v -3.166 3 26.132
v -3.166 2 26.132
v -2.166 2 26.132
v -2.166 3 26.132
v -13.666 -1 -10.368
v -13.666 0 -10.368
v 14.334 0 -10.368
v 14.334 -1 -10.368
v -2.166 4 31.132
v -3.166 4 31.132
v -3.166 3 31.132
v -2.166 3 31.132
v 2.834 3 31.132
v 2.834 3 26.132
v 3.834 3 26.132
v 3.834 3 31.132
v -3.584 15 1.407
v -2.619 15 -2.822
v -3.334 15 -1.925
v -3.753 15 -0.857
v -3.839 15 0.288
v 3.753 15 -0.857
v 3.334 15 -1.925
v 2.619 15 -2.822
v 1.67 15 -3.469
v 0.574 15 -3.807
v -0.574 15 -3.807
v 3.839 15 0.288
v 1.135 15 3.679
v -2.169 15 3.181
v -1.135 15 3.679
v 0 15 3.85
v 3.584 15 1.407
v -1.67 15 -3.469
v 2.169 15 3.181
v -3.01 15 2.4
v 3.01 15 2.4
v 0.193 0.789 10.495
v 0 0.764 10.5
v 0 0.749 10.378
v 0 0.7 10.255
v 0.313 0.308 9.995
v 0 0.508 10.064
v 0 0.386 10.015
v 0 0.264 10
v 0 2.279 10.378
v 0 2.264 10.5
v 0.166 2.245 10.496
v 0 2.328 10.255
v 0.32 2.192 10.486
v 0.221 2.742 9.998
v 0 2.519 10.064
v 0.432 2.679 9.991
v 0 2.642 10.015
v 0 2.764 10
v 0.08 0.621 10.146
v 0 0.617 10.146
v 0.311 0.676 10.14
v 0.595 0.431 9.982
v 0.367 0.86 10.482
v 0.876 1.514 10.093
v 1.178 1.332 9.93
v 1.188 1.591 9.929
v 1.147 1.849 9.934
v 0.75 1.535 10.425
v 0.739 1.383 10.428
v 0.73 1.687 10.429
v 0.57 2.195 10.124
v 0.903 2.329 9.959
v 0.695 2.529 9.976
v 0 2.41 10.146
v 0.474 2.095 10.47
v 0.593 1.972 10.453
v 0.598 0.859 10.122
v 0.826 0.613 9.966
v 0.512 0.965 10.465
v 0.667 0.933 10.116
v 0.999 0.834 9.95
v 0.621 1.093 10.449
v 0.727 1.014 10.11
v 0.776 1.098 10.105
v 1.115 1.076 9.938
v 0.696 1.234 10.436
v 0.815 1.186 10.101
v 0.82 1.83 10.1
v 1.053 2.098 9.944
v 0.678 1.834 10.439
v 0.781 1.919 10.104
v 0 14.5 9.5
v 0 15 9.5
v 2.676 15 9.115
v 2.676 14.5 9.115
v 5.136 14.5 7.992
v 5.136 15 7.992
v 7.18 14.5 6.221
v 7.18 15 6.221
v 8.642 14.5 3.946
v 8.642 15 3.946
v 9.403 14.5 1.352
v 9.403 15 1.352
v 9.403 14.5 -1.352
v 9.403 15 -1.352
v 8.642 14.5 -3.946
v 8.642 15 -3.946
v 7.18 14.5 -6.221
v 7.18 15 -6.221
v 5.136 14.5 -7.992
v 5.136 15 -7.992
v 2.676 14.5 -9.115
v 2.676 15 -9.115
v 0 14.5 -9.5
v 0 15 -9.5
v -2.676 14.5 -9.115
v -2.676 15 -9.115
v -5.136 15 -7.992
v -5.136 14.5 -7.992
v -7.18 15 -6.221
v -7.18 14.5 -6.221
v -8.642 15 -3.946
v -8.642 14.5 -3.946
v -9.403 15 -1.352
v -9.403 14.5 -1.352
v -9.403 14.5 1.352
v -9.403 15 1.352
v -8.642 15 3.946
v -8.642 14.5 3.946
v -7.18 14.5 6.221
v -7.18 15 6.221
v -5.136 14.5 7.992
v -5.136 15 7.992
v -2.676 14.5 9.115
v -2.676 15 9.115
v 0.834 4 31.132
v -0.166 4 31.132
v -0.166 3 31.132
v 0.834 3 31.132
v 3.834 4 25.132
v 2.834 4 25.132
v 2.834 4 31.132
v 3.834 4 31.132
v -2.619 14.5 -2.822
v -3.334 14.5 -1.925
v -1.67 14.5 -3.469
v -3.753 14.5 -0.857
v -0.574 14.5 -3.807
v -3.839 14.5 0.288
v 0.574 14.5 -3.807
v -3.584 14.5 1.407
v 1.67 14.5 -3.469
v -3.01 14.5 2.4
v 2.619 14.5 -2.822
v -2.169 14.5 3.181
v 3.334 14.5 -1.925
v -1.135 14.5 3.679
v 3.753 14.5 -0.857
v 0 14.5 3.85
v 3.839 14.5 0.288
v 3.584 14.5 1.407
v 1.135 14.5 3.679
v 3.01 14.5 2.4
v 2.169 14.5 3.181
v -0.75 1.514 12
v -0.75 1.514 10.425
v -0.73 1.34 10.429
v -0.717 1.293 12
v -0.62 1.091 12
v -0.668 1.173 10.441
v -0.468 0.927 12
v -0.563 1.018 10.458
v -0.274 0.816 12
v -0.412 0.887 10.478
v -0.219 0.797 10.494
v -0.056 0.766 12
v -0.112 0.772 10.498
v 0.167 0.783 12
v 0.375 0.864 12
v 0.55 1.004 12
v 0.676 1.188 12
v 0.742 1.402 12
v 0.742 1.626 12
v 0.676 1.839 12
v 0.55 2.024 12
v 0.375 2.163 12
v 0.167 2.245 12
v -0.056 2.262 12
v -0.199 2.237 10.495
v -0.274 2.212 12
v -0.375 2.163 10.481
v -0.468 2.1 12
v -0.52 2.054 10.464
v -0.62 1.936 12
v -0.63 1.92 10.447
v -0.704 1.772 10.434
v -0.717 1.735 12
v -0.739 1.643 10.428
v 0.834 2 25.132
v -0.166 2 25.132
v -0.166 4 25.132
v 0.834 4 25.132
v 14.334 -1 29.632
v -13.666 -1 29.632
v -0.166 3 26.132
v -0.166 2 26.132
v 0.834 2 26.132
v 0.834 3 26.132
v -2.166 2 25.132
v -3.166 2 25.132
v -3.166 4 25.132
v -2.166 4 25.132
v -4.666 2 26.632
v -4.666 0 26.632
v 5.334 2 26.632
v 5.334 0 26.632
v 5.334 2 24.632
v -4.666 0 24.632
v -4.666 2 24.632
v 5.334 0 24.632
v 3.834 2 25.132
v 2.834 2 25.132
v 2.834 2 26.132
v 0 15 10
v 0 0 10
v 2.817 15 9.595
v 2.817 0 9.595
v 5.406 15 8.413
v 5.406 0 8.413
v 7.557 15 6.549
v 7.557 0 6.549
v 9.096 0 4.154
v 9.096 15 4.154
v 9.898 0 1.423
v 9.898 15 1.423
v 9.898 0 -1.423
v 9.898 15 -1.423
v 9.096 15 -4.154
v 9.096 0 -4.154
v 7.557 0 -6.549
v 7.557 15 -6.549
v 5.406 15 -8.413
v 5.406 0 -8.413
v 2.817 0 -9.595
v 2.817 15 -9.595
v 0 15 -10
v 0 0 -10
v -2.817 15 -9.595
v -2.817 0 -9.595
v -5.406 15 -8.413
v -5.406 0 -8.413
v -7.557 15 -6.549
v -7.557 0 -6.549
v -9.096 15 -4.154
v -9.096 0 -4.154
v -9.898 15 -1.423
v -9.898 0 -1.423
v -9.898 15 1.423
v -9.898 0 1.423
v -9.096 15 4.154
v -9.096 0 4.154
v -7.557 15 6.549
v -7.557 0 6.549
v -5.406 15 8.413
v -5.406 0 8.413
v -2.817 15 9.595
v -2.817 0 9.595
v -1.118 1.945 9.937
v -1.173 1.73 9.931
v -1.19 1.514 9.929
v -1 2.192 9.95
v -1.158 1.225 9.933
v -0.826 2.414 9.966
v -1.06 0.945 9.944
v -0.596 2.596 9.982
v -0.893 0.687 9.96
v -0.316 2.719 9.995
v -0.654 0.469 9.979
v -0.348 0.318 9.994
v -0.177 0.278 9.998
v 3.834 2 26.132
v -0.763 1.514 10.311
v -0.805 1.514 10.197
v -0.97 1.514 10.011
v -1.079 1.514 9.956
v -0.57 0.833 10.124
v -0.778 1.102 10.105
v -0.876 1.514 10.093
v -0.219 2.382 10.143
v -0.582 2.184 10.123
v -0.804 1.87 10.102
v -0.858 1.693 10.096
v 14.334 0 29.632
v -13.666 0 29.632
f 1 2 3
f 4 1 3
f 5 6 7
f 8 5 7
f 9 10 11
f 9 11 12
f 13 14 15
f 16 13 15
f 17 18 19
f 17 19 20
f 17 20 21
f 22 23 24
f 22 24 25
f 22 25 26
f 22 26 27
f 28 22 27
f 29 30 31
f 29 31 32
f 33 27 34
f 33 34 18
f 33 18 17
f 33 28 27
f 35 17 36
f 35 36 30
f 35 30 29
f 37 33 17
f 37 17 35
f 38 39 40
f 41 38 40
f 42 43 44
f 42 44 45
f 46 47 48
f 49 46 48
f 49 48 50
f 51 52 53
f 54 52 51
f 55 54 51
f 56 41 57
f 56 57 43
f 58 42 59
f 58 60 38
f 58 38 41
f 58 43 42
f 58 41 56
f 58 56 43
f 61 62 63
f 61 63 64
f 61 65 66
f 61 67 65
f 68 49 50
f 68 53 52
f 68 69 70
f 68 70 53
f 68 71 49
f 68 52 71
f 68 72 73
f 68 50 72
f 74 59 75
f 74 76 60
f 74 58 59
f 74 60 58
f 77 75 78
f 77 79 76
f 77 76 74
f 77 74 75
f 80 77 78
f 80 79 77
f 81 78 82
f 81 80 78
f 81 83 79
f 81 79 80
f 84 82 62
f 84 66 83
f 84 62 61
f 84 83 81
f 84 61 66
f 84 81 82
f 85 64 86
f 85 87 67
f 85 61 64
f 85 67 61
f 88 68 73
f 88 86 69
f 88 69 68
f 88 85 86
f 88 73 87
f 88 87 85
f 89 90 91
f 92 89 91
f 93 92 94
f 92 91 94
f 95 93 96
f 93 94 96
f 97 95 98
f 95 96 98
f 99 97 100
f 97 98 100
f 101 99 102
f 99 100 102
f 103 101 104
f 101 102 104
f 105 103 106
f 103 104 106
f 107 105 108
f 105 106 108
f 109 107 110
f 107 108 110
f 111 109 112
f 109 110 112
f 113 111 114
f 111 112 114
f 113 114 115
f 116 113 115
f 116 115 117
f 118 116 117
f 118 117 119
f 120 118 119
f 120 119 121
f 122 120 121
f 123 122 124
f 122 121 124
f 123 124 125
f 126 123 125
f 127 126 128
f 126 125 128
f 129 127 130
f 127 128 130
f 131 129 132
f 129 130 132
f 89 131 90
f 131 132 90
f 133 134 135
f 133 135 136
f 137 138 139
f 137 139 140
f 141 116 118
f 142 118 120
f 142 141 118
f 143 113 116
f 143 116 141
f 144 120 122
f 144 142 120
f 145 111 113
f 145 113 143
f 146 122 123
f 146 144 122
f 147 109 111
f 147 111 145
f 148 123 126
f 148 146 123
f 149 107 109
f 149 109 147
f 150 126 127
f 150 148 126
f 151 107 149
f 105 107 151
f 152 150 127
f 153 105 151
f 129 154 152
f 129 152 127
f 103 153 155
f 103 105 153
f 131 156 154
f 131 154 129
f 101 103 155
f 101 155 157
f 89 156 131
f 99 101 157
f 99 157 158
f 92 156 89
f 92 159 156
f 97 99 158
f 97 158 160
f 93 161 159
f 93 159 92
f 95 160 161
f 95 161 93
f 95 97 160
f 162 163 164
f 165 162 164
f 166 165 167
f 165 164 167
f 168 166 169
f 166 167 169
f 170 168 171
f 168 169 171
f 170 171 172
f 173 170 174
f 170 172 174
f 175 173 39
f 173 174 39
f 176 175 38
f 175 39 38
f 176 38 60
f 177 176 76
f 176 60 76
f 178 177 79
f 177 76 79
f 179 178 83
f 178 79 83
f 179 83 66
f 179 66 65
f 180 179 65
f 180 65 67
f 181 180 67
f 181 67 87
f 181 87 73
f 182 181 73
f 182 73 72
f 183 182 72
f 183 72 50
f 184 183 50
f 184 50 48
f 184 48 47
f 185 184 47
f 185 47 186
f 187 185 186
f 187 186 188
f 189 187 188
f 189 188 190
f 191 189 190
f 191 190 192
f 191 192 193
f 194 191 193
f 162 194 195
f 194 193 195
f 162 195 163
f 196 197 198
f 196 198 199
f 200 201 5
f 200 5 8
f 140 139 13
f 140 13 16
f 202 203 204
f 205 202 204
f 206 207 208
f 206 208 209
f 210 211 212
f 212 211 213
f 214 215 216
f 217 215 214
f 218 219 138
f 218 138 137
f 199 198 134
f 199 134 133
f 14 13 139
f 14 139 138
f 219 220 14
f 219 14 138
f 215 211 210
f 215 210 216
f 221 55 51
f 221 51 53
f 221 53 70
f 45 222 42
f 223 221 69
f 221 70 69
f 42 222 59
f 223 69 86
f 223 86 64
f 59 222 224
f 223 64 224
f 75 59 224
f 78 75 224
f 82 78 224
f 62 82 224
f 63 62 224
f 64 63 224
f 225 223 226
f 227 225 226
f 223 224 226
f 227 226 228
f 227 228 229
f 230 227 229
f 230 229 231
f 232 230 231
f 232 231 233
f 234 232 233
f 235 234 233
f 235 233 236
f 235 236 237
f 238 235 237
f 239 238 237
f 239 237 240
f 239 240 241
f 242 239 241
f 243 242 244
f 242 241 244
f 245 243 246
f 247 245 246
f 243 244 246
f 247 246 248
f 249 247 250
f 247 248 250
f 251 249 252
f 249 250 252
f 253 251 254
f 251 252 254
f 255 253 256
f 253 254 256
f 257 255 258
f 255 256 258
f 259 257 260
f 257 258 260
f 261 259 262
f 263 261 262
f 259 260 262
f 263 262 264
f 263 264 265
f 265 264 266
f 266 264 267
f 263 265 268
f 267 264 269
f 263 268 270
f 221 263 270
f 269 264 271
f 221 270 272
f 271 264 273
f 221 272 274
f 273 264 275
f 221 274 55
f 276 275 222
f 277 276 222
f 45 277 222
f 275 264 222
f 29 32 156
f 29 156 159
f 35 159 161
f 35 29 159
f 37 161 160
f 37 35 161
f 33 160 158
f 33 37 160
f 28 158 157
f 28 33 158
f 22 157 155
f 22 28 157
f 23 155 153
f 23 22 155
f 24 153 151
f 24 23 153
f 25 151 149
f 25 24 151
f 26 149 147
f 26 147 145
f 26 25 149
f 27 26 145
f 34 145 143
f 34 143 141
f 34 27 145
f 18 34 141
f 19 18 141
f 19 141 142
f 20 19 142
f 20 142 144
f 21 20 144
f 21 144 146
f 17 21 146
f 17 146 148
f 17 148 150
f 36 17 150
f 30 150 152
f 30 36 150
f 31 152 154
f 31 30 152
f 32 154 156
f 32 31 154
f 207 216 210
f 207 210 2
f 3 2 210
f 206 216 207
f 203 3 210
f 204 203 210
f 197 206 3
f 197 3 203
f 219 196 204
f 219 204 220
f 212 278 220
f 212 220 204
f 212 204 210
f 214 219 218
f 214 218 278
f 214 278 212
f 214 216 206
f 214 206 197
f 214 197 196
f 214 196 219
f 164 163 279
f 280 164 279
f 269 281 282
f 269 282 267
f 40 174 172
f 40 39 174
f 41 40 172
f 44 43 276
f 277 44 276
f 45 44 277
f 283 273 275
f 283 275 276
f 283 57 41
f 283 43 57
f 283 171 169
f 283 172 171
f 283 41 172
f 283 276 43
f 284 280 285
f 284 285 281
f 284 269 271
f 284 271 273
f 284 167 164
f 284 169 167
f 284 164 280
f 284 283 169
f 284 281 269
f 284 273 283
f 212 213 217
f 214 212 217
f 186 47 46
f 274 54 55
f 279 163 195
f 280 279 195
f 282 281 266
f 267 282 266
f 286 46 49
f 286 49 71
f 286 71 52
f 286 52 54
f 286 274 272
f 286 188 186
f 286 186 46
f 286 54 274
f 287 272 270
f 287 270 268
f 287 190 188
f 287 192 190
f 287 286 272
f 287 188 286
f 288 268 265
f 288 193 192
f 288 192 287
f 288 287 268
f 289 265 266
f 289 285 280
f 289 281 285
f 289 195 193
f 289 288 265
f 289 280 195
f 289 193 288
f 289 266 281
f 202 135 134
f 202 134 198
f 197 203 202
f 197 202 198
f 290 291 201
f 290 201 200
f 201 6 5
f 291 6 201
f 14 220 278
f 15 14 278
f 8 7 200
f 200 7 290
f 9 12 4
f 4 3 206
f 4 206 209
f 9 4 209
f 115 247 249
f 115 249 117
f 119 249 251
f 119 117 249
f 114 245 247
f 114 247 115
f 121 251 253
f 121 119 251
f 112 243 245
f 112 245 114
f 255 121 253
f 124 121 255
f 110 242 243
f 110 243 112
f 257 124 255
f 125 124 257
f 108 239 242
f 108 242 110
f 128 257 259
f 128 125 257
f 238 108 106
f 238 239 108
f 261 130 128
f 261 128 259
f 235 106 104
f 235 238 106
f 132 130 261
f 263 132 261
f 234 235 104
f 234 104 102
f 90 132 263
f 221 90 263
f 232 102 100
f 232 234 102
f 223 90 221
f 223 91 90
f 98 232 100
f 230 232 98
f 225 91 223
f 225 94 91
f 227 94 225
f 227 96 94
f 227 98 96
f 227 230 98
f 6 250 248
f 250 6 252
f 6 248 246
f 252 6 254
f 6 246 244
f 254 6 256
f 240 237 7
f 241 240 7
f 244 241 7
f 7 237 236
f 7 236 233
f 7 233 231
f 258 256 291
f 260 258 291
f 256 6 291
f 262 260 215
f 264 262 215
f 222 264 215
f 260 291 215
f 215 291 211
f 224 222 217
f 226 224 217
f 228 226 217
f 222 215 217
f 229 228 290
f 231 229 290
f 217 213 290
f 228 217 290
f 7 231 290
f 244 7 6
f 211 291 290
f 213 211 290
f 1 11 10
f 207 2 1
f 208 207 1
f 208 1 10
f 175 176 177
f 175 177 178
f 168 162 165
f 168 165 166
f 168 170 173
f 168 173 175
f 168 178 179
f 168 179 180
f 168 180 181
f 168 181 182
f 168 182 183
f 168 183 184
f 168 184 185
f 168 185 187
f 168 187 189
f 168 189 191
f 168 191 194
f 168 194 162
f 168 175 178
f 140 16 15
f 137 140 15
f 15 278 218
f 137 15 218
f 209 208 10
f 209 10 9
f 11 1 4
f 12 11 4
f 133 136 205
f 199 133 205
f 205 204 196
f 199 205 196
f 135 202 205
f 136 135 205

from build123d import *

# Parameters (mm, degrees)
ESQUISSE1_R             = 10
BOSS_EXTRU_1_DEPTH      = 15
ESQUISSE2_R             = 9.5
ESQUISSE2_R_2           = 3.85
ENL_V_MAT_EXTRU_1_DEPTH = 0.5
ESQUISSE3_R             = 0.75
BOSS_EXTRU_2_DEPTH      = 3
CONG_1_R                = 0.5
ESQUISSE4_W             = 28
ESQUISSE4_H             = 40
BOSS_EXTRU_3_DEPTH      = 1
ESQUISSE5_W             = 10
ESQUISSE5_H             = 2
BOSS_EXTRU_4_DEPTH      = 2
ESQUISSE6_W             = 1
ESQUISSE6_H             = 1
BOSS_EXTRU_5_DEPTH      = 2
ESQUISSE8_W             = 1
ESQUISSE8_H             = 1
BOSS_EXTRU_6_DEPTH      = 5


with BuildPart() as part:
    # Esquisse1 → Boss.-Extru.1 (new body)
    with BuildSketch(Plane(origin=(0, 0, 0), x_dir=(1, 0, 0), z_dir=(0, 1, 0))):
        with Locations(Location((0, 0, 0), (0, 0, 270))):
            Circle(ESQUISSE1_R)
    extrude(amount=BOSS_EXTRU_1_DEPTH)

    # Esquisse2 → Enlèv. mat.-Extru.1 (cut)
    with BuildSketch(Plane(origin=(0, 15, 0), x_dir=(1, 0, 0), z_dir=(0, 1, 0))):
        with Locations(Location((0, 0, 0), (0, 0, 270))):
            Circle(ESQUISSE2_R)
        with Locations(Location((0, 0, 0), (0, 0, 270))):
            Circle(ESQUISSE2_R_2, mode=Mode.SUBTRACT)
    extrude(amount=-ENL_V_MAT_EXTRU_1_DEPTH, mode=Mode.SUBTRACT)

    # Esquisse3 → Boss.-Extru.2 (add)
    with BuildSketch(Plane.XY.offset(9)):
        with Locations(Location((0, 1.513817118, 0), (0, 0, 180))):
            Circle(ESQUISSE3_R)
    extrude(amount=BOSS_EXTRU_2_DEPTH)

    # Congé1
    cong_1_edges = [part.edges().sort_by_distance(p)[0] for p in [
        (0.75, 1.513817118, 9.971835338),
    ]]
    fillet(cong_1_edges, radius=CONG_1_R)

    # Esquisse4 → Boss.-Extru.3 (add)
    with BuildSketch(Plane.XZ):
        with Locations((0.33364204, 9.631825749)):
            Rectangle(ESQUISSE4_W, ESQUISSE4_H)
    extrude(amount=BOSS_EXTRU_3_DEPTH)

    # Esquisse5 → Boss.-Extru.4 (add)
    with BuildSketch(Plane(origin=(0, 0, 0), x_dir=(1, 0, 0), z_dir=(0, 1, 0))):
        with Locations((0.33364204, -25.631825749)):
            Rectangle(ESQUISSE5_W, ESQUISSE5_H)
    extrude(amount=BOSS_EXTRU_4_DEPTH)

    # Esquisse6 → Boss.-Extru.5 (add)
    with BuildSketch(Plane(origin=(0, 2, 0), x_dir=(1, 0, 0), z_dir=(0, 1, 0))):
        with Locations((-2.66635796, -25.631825749)):
            Rectangle(ESQUISSE6_W, ESQUISSE6_H)
        with Locations((0.33364204, -25.631825749)):
            Rectangle(ESQUISSE6_W, ESQUISSE6_H)
        with Locations((3.33364204, -25.631825749)):
            Rectangle(ESQUISSE6_W, ESQUISSE6_H)
    extrude(amount=BOSS_EXTRU_5_DEPTH)

    # Esquisse8 → Boss.-Extru.6 (add)
    with BuildSketch(Plane.XY.offset(26.131825749)):
        with Locations((-2.66635796, 3.5)):
            Rectangle(ESQUISSE8_W, ESQUISSE8_H)
        with Locations((0.33364204, 3.5)):
            Rectangle(ESQUISSE8_W, ESQUISSE8_H)
        with Locations((3.33364204, 3.5)):
            Rectangle(ESQUISSE8_W, ESQUISSE8_H)
    extrude(amount=BOSS_EXTRU_6_DEPTH)


solid = part.part
